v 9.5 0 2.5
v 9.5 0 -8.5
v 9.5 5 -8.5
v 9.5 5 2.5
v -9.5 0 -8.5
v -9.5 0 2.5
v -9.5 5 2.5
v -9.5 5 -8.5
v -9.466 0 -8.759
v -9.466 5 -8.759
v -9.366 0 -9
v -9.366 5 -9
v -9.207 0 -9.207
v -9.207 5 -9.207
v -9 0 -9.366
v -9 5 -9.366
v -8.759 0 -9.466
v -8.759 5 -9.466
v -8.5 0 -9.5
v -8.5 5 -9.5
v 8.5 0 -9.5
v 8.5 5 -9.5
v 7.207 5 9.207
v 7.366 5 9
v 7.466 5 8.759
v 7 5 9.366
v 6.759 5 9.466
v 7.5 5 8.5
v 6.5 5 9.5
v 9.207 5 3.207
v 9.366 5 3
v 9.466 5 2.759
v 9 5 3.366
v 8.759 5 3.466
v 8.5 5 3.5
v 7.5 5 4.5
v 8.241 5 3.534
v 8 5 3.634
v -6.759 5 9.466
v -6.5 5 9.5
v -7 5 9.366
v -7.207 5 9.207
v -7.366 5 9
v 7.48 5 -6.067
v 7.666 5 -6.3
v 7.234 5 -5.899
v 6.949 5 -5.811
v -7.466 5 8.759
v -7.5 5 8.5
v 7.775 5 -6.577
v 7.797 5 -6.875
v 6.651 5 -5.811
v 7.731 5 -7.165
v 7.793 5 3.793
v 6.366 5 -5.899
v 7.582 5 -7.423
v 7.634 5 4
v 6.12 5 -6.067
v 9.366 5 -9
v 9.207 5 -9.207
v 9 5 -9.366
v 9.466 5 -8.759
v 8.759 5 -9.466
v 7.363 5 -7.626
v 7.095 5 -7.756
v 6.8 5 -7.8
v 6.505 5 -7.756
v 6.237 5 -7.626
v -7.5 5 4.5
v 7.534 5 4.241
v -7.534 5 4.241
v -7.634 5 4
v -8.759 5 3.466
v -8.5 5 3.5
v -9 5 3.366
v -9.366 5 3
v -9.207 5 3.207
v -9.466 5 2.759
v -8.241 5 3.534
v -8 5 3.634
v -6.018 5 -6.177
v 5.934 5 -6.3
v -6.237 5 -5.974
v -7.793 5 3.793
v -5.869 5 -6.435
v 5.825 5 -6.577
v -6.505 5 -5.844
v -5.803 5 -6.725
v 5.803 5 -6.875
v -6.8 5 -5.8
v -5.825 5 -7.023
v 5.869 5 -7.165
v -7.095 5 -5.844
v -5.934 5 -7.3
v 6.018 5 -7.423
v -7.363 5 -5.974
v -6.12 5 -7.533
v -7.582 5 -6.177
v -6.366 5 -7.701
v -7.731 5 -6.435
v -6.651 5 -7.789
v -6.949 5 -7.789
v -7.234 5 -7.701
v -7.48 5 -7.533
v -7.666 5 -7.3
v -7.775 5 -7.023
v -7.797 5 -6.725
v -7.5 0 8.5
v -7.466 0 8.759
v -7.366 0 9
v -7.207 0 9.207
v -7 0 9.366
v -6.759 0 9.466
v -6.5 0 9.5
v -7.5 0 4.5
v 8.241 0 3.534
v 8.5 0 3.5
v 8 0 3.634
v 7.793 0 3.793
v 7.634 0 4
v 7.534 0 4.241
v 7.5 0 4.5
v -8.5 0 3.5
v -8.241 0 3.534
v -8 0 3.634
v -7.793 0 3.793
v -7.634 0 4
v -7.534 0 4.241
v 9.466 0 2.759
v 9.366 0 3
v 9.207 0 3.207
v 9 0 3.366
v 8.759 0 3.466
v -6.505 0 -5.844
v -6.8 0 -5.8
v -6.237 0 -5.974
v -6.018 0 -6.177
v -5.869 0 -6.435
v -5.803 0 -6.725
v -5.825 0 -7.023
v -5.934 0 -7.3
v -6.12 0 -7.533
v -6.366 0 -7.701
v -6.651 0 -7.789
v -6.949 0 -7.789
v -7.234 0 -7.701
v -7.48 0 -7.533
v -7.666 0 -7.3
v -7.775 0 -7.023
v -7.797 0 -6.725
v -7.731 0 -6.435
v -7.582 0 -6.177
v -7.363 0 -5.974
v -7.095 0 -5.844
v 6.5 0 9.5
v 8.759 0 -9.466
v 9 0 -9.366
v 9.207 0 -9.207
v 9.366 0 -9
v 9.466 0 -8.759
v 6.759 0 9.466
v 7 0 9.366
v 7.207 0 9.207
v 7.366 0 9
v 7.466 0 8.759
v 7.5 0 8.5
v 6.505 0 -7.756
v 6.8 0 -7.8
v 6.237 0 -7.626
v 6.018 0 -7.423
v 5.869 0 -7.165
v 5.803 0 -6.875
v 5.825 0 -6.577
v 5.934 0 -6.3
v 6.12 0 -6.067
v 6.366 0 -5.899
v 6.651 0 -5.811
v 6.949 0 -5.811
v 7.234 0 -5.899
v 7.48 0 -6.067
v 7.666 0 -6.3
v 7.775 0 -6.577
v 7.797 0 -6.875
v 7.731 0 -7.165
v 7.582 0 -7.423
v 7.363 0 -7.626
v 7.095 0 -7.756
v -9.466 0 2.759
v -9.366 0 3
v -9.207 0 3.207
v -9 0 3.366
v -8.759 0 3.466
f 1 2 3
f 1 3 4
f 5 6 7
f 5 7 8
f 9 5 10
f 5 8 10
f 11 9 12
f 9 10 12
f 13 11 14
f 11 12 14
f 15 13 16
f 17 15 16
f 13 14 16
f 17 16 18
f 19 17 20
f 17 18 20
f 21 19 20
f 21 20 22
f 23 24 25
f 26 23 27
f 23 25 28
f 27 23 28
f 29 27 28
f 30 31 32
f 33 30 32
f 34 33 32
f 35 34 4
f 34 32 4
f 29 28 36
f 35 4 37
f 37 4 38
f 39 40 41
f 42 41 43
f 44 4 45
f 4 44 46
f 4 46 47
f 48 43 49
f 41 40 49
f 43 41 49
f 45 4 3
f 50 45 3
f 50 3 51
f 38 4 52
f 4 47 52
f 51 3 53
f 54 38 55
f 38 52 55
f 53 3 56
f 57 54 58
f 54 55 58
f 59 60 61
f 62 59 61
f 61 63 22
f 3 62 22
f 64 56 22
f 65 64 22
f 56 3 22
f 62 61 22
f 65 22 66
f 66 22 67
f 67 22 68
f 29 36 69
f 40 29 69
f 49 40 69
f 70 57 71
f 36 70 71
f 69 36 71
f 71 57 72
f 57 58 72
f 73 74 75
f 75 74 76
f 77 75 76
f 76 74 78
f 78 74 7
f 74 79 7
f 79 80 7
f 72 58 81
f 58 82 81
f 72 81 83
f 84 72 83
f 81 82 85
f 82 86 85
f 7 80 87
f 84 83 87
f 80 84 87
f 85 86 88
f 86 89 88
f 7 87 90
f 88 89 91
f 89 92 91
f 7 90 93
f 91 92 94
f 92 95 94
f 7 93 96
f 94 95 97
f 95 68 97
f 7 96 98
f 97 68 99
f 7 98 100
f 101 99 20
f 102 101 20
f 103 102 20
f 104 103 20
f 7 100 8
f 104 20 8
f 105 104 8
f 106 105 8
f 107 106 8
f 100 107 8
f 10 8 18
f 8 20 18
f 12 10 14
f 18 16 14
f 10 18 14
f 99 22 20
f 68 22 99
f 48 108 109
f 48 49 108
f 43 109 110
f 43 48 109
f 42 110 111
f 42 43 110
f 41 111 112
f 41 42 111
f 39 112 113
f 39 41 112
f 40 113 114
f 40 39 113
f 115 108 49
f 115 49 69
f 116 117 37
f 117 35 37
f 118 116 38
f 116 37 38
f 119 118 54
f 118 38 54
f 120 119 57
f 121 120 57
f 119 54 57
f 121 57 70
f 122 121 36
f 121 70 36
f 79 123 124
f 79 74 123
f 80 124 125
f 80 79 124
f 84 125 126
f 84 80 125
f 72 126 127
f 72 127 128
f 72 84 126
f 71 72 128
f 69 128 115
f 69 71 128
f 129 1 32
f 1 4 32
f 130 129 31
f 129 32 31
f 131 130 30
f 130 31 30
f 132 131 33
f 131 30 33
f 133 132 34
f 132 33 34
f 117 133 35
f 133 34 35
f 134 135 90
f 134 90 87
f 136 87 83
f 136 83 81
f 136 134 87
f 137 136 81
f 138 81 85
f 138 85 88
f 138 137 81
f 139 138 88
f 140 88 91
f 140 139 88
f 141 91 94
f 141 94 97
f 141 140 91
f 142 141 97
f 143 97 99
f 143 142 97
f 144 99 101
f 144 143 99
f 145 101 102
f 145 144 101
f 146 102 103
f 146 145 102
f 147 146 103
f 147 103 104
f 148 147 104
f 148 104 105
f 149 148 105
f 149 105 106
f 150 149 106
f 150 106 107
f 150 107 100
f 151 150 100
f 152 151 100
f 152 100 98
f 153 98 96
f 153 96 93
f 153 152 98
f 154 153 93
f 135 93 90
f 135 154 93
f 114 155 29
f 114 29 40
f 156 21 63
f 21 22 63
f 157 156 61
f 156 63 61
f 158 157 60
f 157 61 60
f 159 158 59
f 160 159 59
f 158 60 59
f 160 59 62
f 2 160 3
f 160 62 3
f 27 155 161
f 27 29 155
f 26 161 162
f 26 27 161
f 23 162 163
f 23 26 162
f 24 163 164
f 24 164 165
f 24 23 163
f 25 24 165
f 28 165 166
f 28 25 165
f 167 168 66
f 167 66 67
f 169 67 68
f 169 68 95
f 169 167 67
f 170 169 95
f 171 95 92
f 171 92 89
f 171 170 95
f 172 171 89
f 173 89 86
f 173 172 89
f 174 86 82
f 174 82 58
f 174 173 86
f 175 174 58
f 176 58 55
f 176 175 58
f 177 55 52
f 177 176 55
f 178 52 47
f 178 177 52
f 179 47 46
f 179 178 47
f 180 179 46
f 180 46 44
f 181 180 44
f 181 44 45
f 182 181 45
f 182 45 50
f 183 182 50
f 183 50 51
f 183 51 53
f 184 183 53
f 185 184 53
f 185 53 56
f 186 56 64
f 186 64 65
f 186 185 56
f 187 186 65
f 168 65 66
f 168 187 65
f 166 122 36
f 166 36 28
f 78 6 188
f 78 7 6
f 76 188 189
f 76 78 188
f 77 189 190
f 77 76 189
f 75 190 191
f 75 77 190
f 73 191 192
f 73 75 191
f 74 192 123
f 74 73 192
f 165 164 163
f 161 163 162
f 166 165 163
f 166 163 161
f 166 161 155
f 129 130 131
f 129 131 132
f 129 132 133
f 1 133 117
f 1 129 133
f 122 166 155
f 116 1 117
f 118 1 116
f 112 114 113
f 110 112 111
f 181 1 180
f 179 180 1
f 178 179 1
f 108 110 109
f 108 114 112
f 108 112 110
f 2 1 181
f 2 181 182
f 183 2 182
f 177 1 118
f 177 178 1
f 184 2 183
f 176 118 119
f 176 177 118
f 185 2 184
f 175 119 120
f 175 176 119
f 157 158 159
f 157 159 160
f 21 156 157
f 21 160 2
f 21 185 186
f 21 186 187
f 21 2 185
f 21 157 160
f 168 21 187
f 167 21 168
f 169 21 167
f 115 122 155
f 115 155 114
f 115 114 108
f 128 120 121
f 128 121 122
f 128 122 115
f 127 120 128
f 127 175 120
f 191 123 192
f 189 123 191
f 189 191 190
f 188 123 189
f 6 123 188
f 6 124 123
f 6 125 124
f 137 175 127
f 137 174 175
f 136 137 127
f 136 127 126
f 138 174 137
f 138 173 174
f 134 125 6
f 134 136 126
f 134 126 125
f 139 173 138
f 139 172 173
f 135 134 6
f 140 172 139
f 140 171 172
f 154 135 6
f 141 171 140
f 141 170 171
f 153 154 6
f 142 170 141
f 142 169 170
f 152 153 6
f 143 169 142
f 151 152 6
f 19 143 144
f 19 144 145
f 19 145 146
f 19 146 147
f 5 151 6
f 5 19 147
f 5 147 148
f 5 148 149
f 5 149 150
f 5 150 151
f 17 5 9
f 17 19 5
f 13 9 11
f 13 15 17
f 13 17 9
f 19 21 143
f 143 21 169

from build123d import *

# Parameters (mm, degrees)
ESQUISSE2_R        = 1
BOSS_EXTRU_1_DEPTH = 5
CONG_1_R           = 1


with BuildPart() as part:
    # Esquisse2 → Boss.-Extru.1 (new body)
    with BuildSketch(Plane(origin=(0, 0, 0), x_dir=(1, 0, 0), z_dir=(0, 1, 0))):
        Polygon((-9.5, -3.5), (-9.5, 9.5), (9.5, 9.5), (9.5, -3.5), (7.5, -3.5), (7.5, -9.5), (-7.5, -9.5), (-7.5, -3.5), align=None)
        with Locations(Location((-6.8, 6.8, 0), (0, 0, 270))):
            Circle(ESQUISSE2_R, mode=Mode.SUBTRACT)
        with Locations(Location((6.8, 6.8, 0), (0, 0, 90))):
            Circle(ESQUISSE2_R, mode=Mode.SUBTRACT)
    extrude(amount=BOSS_EXTRU_1_DEPTH)

    # Congé1
    cong_1_edges = [part.edges().sort_by_distance(p)[0] for p in [
        (9.5, 2.5, -9.5),
        (9.5, 2.5, 3.5),
        (7.5, 2.5, 3.5),
        (7.5, 2.5, 9.5),
        (-7.5, 2.5, 9.5),
        (-7.5, 2.5, 3.5),
        (-9.5, 2.5, 3.5),
        (-9.5, 2.5, -9.5),
    ]]
    fillet(cong_1_edges, radius=CONG_1_R - 0.0001)  # a hair under: the kernel refuses the full size


solid = part.part
